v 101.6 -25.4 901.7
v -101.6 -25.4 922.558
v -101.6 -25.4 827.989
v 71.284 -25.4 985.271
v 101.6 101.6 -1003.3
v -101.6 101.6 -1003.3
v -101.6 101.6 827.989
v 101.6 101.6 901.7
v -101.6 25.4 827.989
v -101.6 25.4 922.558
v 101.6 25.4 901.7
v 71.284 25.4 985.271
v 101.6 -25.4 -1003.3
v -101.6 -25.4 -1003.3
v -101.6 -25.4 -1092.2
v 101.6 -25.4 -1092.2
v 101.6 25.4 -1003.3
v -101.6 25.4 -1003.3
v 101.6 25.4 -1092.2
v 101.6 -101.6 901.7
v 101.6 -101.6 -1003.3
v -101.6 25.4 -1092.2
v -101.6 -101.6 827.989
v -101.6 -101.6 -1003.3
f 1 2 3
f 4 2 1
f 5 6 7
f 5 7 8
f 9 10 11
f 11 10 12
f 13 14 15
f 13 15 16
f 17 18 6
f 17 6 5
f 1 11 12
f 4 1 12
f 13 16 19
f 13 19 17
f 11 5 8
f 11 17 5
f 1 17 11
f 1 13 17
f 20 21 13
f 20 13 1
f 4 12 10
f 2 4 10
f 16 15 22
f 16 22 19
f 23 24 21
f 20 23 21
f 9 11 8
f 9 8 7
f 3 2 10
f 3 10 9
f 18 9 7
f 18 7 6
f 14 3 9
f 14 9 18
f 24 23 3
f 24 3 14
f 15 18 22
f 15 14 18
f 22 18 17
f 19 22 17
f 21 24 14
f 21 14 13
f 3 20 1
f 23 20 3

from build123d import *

# Parameters (mm, degrees)
F1_DEPTH = 101.6
F0_W     = 203.2
F0_H     = 88.9
F2_DEPTH = 25.4


with BuildPart() as f1:
    # F0 (on Front) → F1 (new body, symmetric)
    with BuildSketch(Plane.XZ):
        Polygon((101.6, -1003.3), (101.6, 901.7), (-101.6, 827.9892), (-101.6, -1003.3), align=None)
    extrude(amount=F1_DEPTH, both=True)

    # F0 (on Front) → F2 (join, symmetric)
    with BuildSketch(Plane.XZ):
        Polygon((71.284475, 985.2714), (-101.6, 922.557557), (-101.6, 827.9892), (101.6, 901.7), align=None)
        with Locations((0, -1047.75)):
            Rectangle(F0_W, F0_H)
    extrude(amount=F2_DEPTH, both=True)


solid = f1.part
